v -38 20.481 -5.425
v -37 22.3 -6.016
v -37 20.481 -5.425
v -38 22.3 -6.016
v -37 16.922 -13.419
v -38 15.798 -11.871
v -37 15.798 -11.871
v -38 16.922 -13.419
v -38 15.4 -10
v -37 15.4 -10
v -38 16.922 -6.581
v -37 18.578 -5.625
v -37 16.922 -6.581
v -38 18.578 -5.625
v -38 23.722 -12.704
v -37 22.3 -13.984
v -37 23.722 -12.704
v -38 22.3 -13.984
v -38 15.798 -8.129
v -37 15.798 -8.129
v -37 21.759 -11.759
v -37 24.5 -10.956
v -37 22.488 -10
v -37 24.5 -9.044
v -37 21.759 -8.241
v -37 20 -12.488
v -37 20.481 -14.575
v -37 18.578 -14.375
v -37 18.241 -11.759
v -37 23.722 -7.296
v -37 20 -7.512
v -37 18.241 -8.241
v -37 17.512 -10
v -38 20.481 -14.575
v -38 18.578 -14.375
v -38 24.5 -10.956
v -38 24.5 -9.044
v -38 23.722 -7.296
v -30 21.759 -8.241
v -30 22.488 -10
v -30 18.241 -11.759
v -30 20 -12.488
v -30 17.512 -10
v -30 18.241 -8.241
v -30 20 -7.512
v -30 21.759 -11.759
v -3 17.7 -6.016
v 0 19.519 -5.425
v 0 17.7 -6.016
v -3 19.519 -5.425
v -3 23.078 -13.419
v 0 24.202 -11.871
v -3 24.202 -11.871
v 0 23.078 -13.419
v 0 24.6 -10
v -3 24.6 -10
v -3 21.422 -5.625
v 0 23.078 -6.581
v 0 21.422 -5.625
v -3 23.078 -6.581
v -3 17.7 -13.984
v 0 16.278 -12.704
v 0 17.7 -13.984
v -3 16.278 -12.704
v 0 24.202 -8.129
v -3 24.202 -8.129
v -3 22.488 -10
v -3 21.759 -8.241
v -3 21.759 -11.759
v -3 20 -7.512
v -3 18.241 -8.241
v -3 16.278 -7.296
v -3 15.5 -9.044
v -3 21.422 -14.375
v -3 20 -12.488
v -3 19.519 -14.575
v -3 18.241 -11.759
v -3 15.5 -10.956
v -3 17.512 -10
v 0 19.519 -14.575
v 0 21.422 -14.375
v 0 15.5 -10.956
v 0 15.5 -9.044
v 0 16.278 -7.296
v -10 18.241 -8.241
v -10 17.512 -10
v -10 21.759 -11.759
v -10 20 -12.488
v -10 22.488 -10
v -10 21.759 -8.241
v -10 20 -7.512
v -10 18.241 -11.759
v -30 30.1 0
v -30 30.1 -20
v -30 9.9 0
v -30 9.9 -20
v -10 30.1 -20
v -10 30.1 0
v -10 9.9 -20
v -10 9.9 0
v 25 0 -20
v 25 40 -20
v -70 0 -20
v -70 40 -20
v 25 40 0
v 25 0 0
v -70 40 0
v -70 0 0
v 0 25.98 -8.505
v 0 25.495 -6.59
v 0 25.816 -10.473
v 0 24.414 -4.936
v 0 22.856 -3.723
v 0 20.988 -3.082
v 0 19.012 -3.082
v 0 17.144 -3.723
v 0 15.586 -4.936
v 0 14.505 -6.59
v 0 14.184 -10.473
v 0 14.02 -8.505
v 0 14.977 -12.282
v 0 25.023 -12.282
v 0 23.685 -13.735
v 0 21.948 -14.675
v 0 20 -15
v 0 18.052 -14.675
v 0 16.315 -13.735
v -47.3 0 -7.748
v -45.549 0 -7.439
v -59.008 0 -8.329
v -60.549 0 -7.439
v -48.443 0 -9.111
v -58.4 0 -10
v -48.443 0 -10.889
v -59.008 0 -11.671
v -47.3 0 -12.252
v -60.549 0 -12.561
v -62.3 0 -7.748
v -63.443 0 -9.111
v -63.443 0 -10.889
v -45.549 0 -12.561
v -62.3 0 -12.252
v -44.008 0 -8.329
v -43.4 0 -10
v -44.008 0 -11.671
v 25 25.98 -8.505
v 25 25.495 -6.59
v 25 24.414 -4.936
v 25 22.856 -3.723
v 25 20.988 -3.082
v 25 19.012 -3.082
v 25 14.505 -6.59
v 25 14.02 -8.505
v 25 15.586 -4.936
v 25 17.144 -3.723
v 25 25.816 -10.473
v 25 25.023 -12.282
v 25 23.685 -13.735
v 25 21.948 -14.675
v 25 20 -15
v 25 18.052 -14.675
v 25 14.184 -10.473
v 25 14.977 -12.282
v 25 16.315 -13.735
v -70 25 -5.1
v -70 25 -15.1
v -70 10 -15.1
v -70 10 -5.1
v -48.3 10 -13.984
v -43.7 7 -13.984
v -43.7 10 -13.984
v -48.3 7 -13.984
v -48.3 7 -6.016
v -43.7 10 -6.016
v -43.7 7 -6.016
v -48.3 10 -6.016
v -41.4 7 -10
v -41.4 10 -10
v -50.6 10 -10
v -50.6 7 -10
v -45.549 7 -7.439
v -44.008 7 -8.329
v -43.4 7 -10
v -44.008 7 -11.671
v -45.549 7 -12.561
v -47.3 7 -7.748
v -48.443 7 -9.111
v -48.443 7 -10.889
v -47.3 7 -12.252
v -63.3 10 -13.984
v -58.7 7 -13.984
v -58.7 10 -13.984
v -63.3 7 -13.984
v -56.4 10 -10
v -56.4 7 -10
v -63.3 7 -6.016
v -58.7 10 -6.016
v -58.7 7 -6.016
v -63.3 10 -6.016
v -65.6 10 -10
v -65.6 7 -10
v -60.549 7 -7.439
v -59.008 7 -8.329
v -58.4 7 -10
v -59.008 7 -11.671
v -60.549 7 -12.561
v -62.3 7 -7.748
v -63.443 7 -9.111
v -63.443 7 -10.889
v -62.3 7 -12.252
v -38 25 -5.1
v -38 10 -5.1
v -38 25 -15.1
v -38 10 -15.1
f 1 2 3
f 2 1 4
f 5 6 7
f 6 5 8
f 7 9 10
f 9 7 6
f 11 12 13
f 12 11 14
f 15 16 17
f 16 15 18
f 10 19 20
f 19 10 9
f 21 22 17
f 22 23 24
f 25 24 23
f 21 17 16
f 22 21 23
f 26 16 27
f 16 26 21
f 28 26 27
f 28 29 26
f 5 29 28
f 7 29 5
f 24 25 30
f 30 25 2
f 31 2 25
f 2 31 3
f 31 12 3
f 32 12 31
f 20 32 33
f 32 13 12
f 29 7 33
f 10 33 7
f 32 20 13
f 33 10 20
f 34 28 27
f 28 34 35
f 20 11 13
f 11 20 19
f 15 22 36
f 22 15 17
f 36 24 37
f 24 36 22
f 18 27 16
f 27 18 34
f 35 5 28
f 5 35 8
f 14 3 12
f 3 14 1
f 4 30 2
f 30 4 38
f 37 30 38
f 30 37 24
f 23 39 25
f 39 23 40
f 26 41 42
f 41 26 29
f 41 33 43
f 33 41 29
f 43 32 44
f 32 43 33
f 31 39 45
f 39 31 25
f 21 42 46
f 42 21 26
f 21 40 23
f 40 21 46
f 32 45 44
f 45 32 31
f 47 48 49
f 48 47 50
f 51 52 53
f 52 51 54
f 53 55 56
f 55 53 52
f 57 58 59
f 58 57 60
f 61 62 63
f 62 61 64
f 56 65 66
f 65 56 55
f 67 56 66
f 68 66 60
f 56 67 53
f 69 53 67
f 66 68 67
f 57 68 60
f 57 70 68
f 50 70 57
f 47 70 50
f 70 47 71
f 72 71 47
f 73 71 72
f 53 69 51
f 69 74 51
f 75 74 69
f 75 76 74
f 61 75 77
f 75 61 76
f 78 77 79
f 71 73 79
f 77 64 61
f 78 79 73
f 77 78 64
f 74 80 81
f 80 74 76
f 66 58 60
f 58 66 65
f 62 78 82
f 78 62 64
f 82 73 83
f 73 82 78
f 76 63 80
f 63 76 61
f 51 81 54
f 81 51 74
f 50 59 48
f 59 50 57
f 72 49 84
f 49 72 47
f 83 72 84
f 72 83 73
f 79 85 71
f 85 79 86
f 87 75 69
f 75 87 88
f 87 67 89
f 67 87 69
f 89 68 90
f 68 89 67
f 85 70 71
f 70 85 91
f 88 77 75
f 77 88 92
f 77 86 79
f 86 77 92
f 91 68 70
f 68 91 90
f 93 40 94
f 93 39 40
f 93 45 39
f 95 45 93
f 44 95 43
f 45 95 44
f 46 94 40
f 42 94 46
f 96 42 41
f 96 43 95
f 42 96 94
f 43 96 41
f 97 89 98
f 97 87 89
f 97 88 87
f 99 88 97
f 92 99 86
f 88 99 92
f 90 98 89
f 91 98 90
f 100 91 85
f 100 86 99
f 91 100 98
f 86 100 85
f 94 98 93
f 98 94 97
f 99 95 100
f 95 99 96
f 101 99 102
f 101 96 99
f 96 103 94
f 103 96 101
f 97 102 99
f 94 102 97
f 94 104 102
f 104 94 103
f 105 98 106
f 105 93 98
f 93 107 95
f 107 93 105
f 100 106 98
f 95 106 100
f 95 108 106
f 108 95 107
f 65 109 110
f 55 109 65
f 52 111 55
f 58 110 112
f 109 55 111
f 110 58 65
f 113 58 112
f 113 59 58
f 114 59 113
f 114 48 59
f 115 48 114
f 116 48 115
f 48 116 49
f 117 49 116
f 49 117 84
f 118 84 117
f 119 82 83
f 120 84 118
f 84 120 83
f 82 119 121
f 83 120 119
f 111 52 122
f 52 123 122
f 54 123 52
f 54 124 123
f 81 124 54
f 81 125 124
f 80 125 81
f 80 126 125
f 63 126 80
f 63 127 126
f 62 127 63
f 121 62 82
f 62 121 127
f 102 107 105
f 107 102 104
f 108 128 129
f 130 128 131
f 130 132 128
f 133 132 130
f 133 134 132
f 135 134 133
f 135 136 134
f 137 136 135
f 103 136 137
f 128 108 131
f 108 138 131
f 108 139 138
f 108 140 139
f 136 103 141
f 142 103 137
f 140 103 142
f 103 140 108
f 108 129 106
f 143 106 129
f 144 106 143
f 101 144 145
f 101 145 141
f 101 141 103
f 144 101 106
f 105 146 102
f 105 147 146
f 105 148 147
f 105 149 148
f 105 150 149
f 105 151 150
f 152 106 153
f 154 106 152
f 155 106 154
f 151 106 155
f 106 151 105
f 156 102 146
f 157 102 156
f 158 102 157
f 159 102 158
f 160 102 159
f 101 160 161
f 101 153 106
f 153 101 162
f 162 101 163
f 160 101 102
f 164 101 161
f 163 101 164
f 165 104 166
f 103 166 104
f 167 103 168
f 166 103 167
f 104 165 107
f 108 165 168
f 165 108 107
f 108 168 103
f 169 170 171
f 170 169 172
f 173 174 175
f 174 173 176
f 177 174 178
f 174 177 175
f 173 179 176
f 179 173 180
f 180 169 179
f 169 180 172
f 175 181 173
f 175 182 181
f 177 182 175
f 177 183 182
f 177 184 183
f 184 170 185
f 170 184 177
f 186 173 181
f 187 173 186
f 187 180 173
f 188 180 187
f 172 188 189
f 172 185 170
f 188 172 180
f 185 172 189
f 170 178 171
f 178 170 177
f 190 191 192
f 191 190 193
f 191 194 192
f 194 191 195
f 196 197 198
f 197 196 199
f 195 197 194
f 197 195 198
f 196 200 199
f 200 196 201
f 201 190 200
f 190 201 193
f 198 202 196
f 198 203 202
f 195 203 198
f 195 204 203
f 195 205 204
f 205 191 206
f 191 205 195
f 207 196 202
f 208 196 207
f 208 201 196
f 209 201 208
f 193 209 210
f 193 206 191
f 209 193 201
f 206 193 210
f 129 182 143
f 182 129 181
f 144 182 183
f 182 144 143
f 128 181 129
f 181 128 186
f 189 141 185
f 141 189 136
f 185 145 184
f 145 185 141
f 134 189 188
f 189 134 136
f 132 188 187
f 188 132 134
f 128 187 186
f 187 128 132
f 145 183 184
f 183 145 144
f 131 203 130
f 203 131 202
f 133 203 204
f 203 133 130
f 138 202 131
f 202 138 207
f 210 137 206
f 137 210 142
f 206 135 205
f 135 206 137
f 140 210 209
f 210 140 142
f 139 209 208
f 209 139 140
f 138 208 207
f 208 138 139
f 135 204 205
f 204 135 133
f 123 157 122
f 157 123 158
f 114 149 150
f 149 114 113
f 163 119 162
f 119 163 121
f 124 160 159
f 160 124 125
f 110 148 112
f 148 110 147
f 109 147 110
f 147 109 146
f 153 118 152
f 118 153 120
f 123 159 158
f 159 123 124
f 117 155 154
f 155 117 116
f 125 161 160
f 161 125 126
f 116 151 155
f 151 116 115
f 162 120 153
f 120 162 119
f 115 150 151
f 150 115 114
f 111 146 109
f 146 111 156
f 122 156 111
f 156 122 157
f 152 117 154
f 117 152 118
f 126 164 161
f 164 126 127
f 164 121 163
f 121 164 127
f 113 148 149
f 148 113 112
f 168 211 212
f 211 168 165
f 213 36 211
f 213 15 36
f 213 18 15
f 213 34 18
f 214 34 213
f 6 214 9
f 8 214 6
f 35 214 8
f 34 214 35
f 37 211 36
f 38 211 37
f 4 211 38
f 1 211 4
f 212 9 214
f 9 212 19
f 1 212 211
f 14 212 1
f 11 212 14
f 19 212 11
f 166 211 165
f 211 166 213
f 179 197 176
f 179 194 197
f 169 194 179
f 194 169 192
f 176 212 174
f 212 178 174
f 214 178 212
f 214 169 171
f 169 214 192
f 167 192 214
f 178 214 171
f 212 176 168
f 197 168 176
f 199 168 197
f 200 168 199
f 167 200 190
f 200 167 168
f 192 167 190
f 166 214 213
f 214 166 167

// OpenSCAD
// file: MCAD/constants.scad
// MIT license


TAU = 6.2831853071; //2*PI, see http://tauday.com/
PI = TAU/2;

// translates a imperial measurement in inches to meters
mm_per_inch = 25.4;
// file: MCAD/math.scad
// MIT license

include <constants.scad>

function deg(angle) = 360*angle/TAU;
// file: MCAD/motors.scad
// Copyright 2010 D1plo1d

// This library is dual licensed under the GPL 3.0 and the GNU Lesser General Public License as per http://creativecommons.org/licenses/LGPL/2.1/ .

include <math.scad>


//generates a motor mount for the specified nema standard #.
module stepper_motor_mount(nema_standard,slide_distance=0, mochup=true, tolerance=0) {
	//dimensions from:
	// http://www.numberfactory.com/NEMA%20Motor%20Dimensions.htm
	if (nema_standard == 17)
	{
		_stepper_motor_mount(
			motor_shaft_diameter = 0.1968*mm_per_inch,
			motor_shaft_length = 0.945*mm_per_inch,
			pilot_diameter = 0.866*mm_per_inch,
			pilot_length = 0.80*mm_per_inch,
			mounting_bolt_circle = 1.725*mm_per_inch,
			bolt_hole_size = 3.5,
			bolt_hole_distance = 1.220*mm_per_inch,
			slide_distance = slide_distance,
			mochup = mochup,
			tolerance=tolerance);
	}
	if (nema_standard == 23)
	{
		_stepper_motor_mount(
			motor_shaft_diameter = 0.250*mm_per_inch,
			motor_shaft_length = 0.81*mm_per_inch,
			pilot_diameter = 1.500*mm_per_inch,
			pilot_length = 0.062*mm_per_inch,
			mounting_bolt_circle = 2.625*mm_per_inch,
			bolt_hole_size = 0.195*mm_per_inch,
			bolt_hole_distance = 1.856*mm_per_inch,
			slide_distance = slide_distance,
			mochup = mochup,
			tolerance=tolerance);
	}
	
}


//inner mehod for creating a stepper motor mount of any dimensions
module _stepper_motor_mount(
	motor_shaft_diameter,
	motor_shaft_length,
	pilot_diameter,
	pilot_length,
	mounting_bolt_circle,
	bolt_hole_size,
	bolt_hole_distance,
	slide_distance = 0,
	motor_length = 40, //arbitray - not standardized
	mochup,
	tolerance = 0
)
{
	union()
	{
	// == centered mount points ==
	//mounting circle inset
	translate([0,slide_distance/2,0]) circle(r = pilot_diameter/2 + tolerance);
	square([pilot_diameter,slide_distance],center=true);
	translate([0,-slide_distance/2,0]) circle(r = pilot_diameter/2 + tolerance);

	//todo: motor shaft hole
	
	//mounting screw holes
	for (x = [-1,1])
	{
		for (y = [-1,1])
		{
			translate([x*bolt_hole_distance/2,y*bolt_hole_distance/2,0])
			{
				translate([0,slide_distance/2,0]) circle(bolt_hole_size/2 + tolerance);
				translate([0,-slide_distance/2,0]) circle(bolt_hole_size/2 + tolerance);
				square([bolt_hole_size+2*tolerance,slide_distance],center=true);
			}
		}
	}
	// == motor mock-up ==
	//motor box
	if (mochup == true)
	{
		%translate([0,0,-5]) cylinder(h = 5, r = pilot_diameter/2);
		%translate(v=[0,0,-motor_length/2])
		{
			cube(size=[bolt_hole_distance+bolt_hole_size+5,bolt_hole_distance+bolt_hole_size+5,motor_length], center = true);
		}
		//shaft
		%translate(v=[0,0,-(motor_length-motor_shaft_length-2)/2])
		{
			%cylinder(r=motor_shaft_diameter/2,h=motor_length+motor_shaft_length--1, center = true);
		}
	}
	}
}
// file: bom.scad
module bom(code, desc, category) {
	echo(str("BOM: ",code," - ", desc, "; ", category));
}
// file: MCAD/shapes.scad
/*
 *  OpenSCAD Shapes Library (www.openscad.org)
 *  Copyright (C) 2009  Catarina Mota
 *  Copyright (C) 2010  Elmo Mäntynen
 *
 *  License: LGPL 2.1 or later
*/

// 2D Shapes
//ngon(sides, radius, center=false);

// 3D Shapes
//box(width, height, depth);
//roundedBox(width, height, depth, factor);
//cone(height, radius);
//ellipticalCylinder(width, height, depth);
//ellipsoid(width, height);
//tube(height, radius, wall, center = false);
//tube2(height, ID, OD, center = false);
//ovalTube(width, height, depth, wall, center = false);
//hexagon(height, depth);
//octagon(height, depth);
//dodecagon(height, depth);
//hexagram(height, depth);
//rightTriangle(adjacent, opposite, depth);
//equiTriangle(side, depth);
//12ptStar(height, depth);

//----------------------

// size is a vector [w, h, d]
module box(width, height, depth) {
  cube([width, height, depth], true);
}

// size is a vector [w, h, d]
module roundedBox(width, height, depth, radius) {
  size=[width, height, depth];
  cube(size - [2*radius,0,0], true);
  cube(size - [0,2*radius,0], true);
  for (x = [radius-size[0]/2, -radius+size[0]/2],
       y = [radius-size[1]/2, -radius+size[1]/2]) {
    translate([x,y,0]) cylinder(r=radius, h=size[2], center=true);
  }
}

module cone(height, radius, center = false) {
  cylinder(height, radius, 0, center);
}

module ellipticalCylinder(w,h, height, center = false) {
  scale([1, h/w, 1]) cylinder(h=height, r=w, center=center);
}

module ellipsoid(w, h, center = false) {
  scale([1, h/w, 1]) sphere(r=w/2, center=center);
}

// wall is wall thickness
module tube(height, radius, wall, center = false) {
  difference() {
    cylinder(h=height, r=radius, center=center);
    cylinder(h=height, r=radius-wall, center=center);
  }
}

// wall is wall thickness
module tube2(height, ID, OD, center = false) {
  difference() {
    cylinder(h=height, r=OD/2, center=center);
    cylinder(h=height, r=ID/2, center=center);
  }
}

// wall is wall thickness
module ovalTube(height, rx, ry, wall, center = false) {
  difference() {
    scale([1, ry/rx, 1]) cylinder(h=height, r=rx, center=center);
    scale([(rx-wall)/rx, (ry-wall)/rx, 1]) cylinder(h=height, r=rx, center=center);
  }
}

// size is the XY plane size, height in Z
module hexagon(size, height) {
  boxWidth = size/1.75;
  for (r = [-60, 0, 60]) rotate([0,0,r]) cube([boxWidth, size, height], true);
}

// size is the XY plane size, height in Z
module octagon(size, height) {
  intersection() {
    cube([size, size, height], true);
    rotate([0,0,45]) cube([size, size, height], true);
  }
}

// size is the XY plane size, height in Z
module dodecagon(size, height) {
  intersection() {
    hexagon(size, height);
    rotate([0,0,90]) hexagon(size, height);
  }
}

// size is the XY plane size, height in Z
module hexagram(size, height) {
  boxWidth=size/1.75;
  for (v = [[0,1],[0,-1],[1,-1]]) {
    intersection() {
      rotate([0,0,60*v[0]]) cube([size, boxWidth, height], true);
      rotate([0,0,60*v[1]]) cube([size, boxWidth, height], true);
    }
  }
}

module rightTriangle(adjacent, opposite, height) {
  difference() {
    translate([-adjacent/2,opposite/2,0]) cube([adjacent, opposite, height], true);
    translate([-adjacent,0,0]) {
      rotate([0,0,atan(opposite/adjacent)]) dislocateBox(adjacent*2, opposite, height+2);
    }
  }
}

module equiTriangle(side, height) {
  difference() {
    translate([-side/2,side/2,0]) cube([side, side, height], true);
    rotate([0,0,30]) dislocateBox(side*2, side, height);
    translate([-side,0,0]) {
      rotate([0,0,60]) dislocateBox(side*2, side, height);
    }
  }
}

module 12ptStar(size, height) {
  starNum = 3;
  starAngle = 360/starNum;
  for (s = [1:starNum]) {
    rotate([0, 0, s*starAngle]) cube([size, size, height], true);
  }
}

//-----------------------
//MOVES THE ROTATION AXIS OF A BOX FROM ITS CENTER TO THE BOTTOM LEFT CORNER
module dislocateBox(w, h, d) {
  translate([0,0,-d/2]) cube([w,h,d]);
}

//-----------------------
// Tests
//module test2D_ellipse(){ellipse(10, 5);}
module test_ellipsoid(){ellipsoid(10, 5);}

//module test2D_egg_outline(){egg_outline();}
// file: MCAD/materials.scad
/*
 * Material colors.
 * 
 * Originally by Hans Häggström, 2010.
 * Dual licenced under Creative Commons Attribution-Share Alike 3.0 and LGPL2 or later
 */

// Material colors
Oak = [0.65, 0.5, 0.4];
Pine = [0.85, 0.7, 0.45];
Birch = [0.9, 0.8, 0.6];
FiberBoard = [0.7, 0.67, 0.6];
BlackPaint = [0.2, 0.2, 0.2];
Iron = [0.36, 0.33, 0.33];
Steel = [0.65, 0.67, 0.72];
Stainless = [0.45, 0.43, 0.5];
Aluminum = [0.77, 0.77, 0.8];
Brass = [0.88, 0.78, 0.5];
Transparent = [1, 1, 1, 0.2];

// Example, uncomment to view
//color_demo();

module color_demo(){
    // Wood
    colorTest(Oak, 0, 0);
    colorTest(Pine, 1, 0);
    colorTest(Birch, 2, 0);

    // Metals
    colorTest(Iron, 0, 1);
    colorTest(Steel, 1, 1);
    colorTest(Stainless, 2, 1);
    colorTest(Aluminum, 3, 1);

    // Mixboards
    colorTest(FiberBoard, 0, 2);

    // Paints
    colorTest(BlackPaint, 0, 3);
}

module colorTest(col, row=0, c=0) {
  color(col) translate([row * 30,c*30,0]) sphere(r=10);
}
// file: MCAD/units.scad
/*
 * Basic units.
 * 
 * Originally by Hans Häggström, 2010.
 * Dual licenced under Creative Commons Attribution-Share Alike 3.0 and LGPL2 or later
 */


mm = 1;
cm = 10 * mm;
dm = 100 * mm;
m = 1000 * mm;

inch = 25.4 * mm;

X = [1, 0, 0];
Y = [0, 1, 0];
Z = [0, 0, 1];

M3 = 3*mm;
M4 = 4*mm;
M5 = 5*mm;
M6 = 6*mm;
M8 = 8*mm;


// When a small distance is needed to overlap shapes for boolean cutting, etc.
epsilon = 0.01*mm;
// file: nemamount.scad
include <MCAD/units.scad>;
include <MCAD/materials.scad>
include <MCAD/stepper.scad>
include <MCAD/motors.scad>
use <MCAD/shapes.scad>;
$fn = 32;




module motor_support(ht)
{
   difference(){
	  translate([-22.5,23.5,0]) rotate([90,0,0]) motor_support_body(ht);
      translate([0,1,0]) rotate([90,0,0]) motor_support_cuts(ht);
      }
}

module motor_support_body(ht)
{
	cube([45,ht,48.5]);

}


module motor_support_cuts(ht)
{
// Motor shaft/pulley cutout.
      translate([0,.1,0]) rotate([90, 0, 0]) cylinder(r=12, h=ht*2, center=true, $fn=60);
      // NEMA 17 stepper motor mounting screws.
      for (x = [-1, 1]) for (z = [-1, 1]) {
        scale([x, 1, z]) translate([15.5, .1, 15.5]) {
          rotate([90, 0, 0]) cylinder(r=4, h=ht*2, center=true, $fn=12);
          }
        }
}



module nema_geared_cutout()
{
    //pulley opening
    translate([16,1,21]) rotate([90,0,0]){
      cylinder (h=22, r=6.6);

      rotate([0,0,45]) {
        translate([14,0,0]) cylinder(h=22, r=1.6, $fn=12);
        translate([0,14,0]) cylinder(h=22, r=1.6, $fn=12);
        translate([-14,0,0]) cylinder(h=22, r=1.6, $fn=12);
        translate([0,-14,0]) cylinder(h=22, r=1.6, $fn=12);
      }
     
    }

    //gearhead indentation
    translate([16,-5,21]) rotate([90,0,0]) cylinder (h=3.35, r=11.25);

  
    
}

module nema_cutout()
{
// Motor shaft/pulley cutout.
      rotate([90, 0, 0]) cylinder(r=12, h=20, center=true, $fn=60);
      // NEMA 17 stepper motor mounting screws.
      for (x = [-1, 1]) for (z = [-1, 1]) {
        scale([x, 1, z]) translate([15.5, -5, 15.5]) {
          rotate([90, 0, 0]) cylinder(r=1.65, h=20, center=true, $fn=12);
          }
        }
}

module nema_motor()
{
   union(){
     nema_mount();
     %translate([0,-4,1]) rotate([90,0,0]) motor(Nema17, size=NemaLong , dualAxis=false);
     }
}

module nema_motor_inverse()
{
   union(){
     nema_mount_inverse();
     %translate([0,-4,1]) rotate([90,0,0]) motor(Nema17, size=NemaLong , dualAxis=false);
     }
}

module nema_geared_motor_inverse()
{
   union(){
     nema_geared_inverse();
     %translate([16,-7,22]) rotate([90,0,180]) motor(Nema17, NemaLong, dualAxis=false);
    
     }
}

module nema_geared_motor()
{
   union(){
     nema_geared_mount();
     %translate([16,-7,22]) rotate([90,0,180]) motor(Nema17, NemaLong, dualAxis=false);
    
     }
}

module nema_geared_mount()
{
   difference(){
      union(){
           translate([-6,-6,0]) rotate([90,0,0]) cube([45,45,7]);
           translate([-6,-13,-4]) rotate([0,0,0]) cube([45,25,5]);
           translate([-6,-13,44]) rotate([0,0,0]) cube([45,25,5]);
           }
      translate([0,0,1]) nema_geared_cutout();
      }


}

module nema_geared_inverse()
{
   difference(){
      union(){
           translate([-6,-6,0]) rotate([90,0,0]) cube([45,45,7]);
           translate([-6,-31,-4]) rotate([0,0,0]) cube([45,25,5]);
           translate([-6,-31,44]) rotate([0,0,0]) cube([45,25,5]);
           }
      translate([0,0,1]) nema_geared_cutout();
      }


}

module nema_mount_inverse()
{
   difference(){
      union(){
        translate([-22.5,0,-21.5]) rotate([90,0,0]) cube([45,45,5]);
        translate([-22.5,-5,-25]) rotate([0,0,0]) cube([45,25,5]);
        }
      translate([0,0,1]) nema_cutout();
      }
   //nema_cutout();
}

module nema_mount()
{
   difference(){
      union(){
        translate([-22.5,0,-21.5]) rotate([90,0,0]) cube([45,45,5]);
        translate([-22.5,-25,-25]) rotate([0,0,0]) cube([45,25,5]);
        }
      translate([0,0,1]) nema_cutout();
      }
   //nema_cutout();
}

//nema_motor_inverse();
translate([0,0,40]) rotate([270,0,0]) nema_motor();
translate([0,0,0]) motor_support(40);
//nema_geared_motor();
//nema_geared_motor_inverse();
// file: vslot.scad
include <MCAD/units.scad>;
include <MCAD/materials.scad>
use <MCAD/shapes.scad>;
use <bom.scad>;

vslot_color_black = [0.27, 0.27, 0.3];
vslot_color = Aluminum;

module vslot(length=50, sections=1, finish, cutout=0) {
	size = sections * 20;
	bom(str("vslot20x", size, "x", length), str("v-slot 20x", size, " (", length , "mm)"), ["rail", "extrusion", "structure"]);
	cutext = [[12.00,4.50],[10.00,4.50],[8.20,2.78],[8.20,5.50],[6.56,5.50],[3.90,2.84],[3.90,0.21],[3.69,0.00],[3.90,-0.21],[3.90,-2.84],[6.56,-5.50],[8.20,-5.50],[8.20,-2.78],[10.00,-4.50],[12.00,-4.50]];
	cutint = [[16.10,0.21],[16.10,2.84],[12.70,6.24],[12.70,8.78],[7.30,8.78],[7.30,6.24],[3.90,2.84],[3.90,0.21],[3.69,0.00],[3.90,-0.21],[3.90,-2.84],[7.30,-6.24],[7.30,-8.78],[12.70,-8.78],[12.70,-6.24],[16.10,-2.84],[16.10,-0.21],[16.31,0.00],];
	cutcorner = [[8.20,8.20],[6.57,8.20],[6.57,7.66],[7.66,6.57],[8.20,6.57]];

	module profile() {
        
		difference() {
         
			translate([0,0,length/2])
			roundedBox(20 * sections, 20, length, 1.5);
         if (cutout == 0){
			for(i = [0,180]) rotate([0,0,-i]) translate([10 * (sections - 1), 0, -epsilon/2]) {
				linear_extrude(length+20) polygon(cutext);
				translate([5,-2.89,-20]) cube([10,5.78,length+40]);
			}
          
			for(i = [90,270]) rotate([0,0,-i])
				for(j = [0:sections-1]) translate([0, (sections - 1) * 10 - 20 * j, -epsilon/2]) {
					linear_extrude(length+epsilon) polygon(cutext);
					translate([5,-2.89,-20]) cube([10,5.78,length+40]);
				}

			for(i = [0:sections-1]) translate([i * 20 - 10 * (sections - 1),0,-epsilon/2])
				cylinder(length+20, 2.1, 2.1);

			for(i = [90,270]) rotate([0,0,-i])
				translate([0,(sections - 1) * 10,-epsilon/2])
				linear_extrude(length+epsilon) polygon(cutcorner);
			for(i = [ 0,180]) rotate([0,0,-i])
				translate([(sections - 1) * 10,0,-epsilon/2])
				linear_extrude(length+epsilon) polygon(cutcorner);

			if(sections > 1)
				for(i = [0:sections-2]) translate([(sections - 3) * 10 - i * 20, 0, -epsilon/2])
					linear_extrude(length+epsilon) polygon(cutint);
                      }
		}
	}

      if (cutout == 1){
		 translate([0,0,length/2]) box(20 * sections, 20.2, length);
          } else {
	     if(finish)
		   color(finish) profile();
	     else
		   color(vslot_color) profile();
         }
}

module vslot20x20(length, finish) { vslot(length, 1, finish); }
module vslot20x20_cutout(length, finish) { vslot(length, 1, finish, 1); }


module vslot20x40(length, finish) { vslot(length, 2, finish); }
module vslot20x40_cutout(length, finish) { vslot(length, 2, finish, 1); }

module vslot20x60(length, finish) { vslot(length, 3, finish); }
module vslot20x60_cutout(length, finish) { vslot(length, 3, finish, 1); }

module vslot20x80(length, finish) { vslot(length, 4, finish); }
module vslot20x80_cutout(length, finish) { vslot(length, 4, finish, 1); }


module vslot_test() {
	$fn = 32;

	vslot20x20(100);

	translate([0, 40, 0])
	vslot20x40(100, vslot_color_black);

	translate([0, 80, 0])
	vslot20x60(100);

	translate([0, 120, 0])
	vslot20x80(100, vslot_color_black);

    translate([0,140,0]) vslot20x20_cutout(100);
}

vslot_test();
// file: spacer.scad
use <mountblock.scad>;
use <nemamount.scad>;
use <MCAD/nuts_and_bolts.scad>;

module spacerblock()
{
   // %translate([18,-5,-2]) rotate([0,180,0]) boltHole(5, length=20);
   // %translate([48,-5,-2]) rotate([0,180,0]) boltHole(5, length=20);
   // %translate([33,-5,-17]) rotate([0,0,0]) boltHole(5,length=30);
   // %translate([33,-5,-21]) nutHole(5);
	difference(){
        translate([60,5,-20]) rotate([180,180,0]) cube([52,20,21]);
        translate([18,-5,-2]) rotate([0,180,0]) boltHole(5, length=20);
        translate([48,-5,-2]) rotate([0,180,0]) boltHole(5, length=20);
        translate([33,-5,-2]) rotate([0,180,0]) boltHole(5, length=20);
        translate([48,-105,-2]) nutHole(5);
        translate([33,-5,-17]) rotate([0,180,0]) cylinder(r=3,length=30);
        translate([33,-5,-21]) nutHole(5);
        }
}

spacerblock();
// file: zcorner.scad
use <mountblock.scad>;
use <nemamount.scad>;
use <MCAD/nuts_and_bolts.scad>;

module zmotor_body()
{
    translate([0,0,0]) rotate([0,180,0]) mountblock();
	translate([-40,-2,39]) rotate([0,90,90]) nema_geared_motor();
    translate([-70,-10,-20]) cube([31,60,20]);
    translate([-41,-10,-20]) cube([41,10,20]);
    translate([-41,40,-20]) cube([41,10,20]);
    translate([0,-10,-20]) cube([31,60,20]);
    %translate([-46,41,-10]) rotate([90,0,0]) nutHole(5);
    
   // %translate([-38,20,-10.1]) rotate([0,90,180]) cylinder(r=6,h=33);
    
    %translate([20,40,-1]) rotate([0,180,0]) boltHole(5,length=30);
    %translate([ 0,40,-1]) rotate([0,180,0]) boltHole(5,length=30);
    %translate([-4,0,-1]) rotate([0,180,0]) boltHole(5,length=50);
   // %translate([-1,20,-9.1]) rotate([0,90,0]) cylinder(r=6,h=34);
}

module zmotor_cuts()
{
    translate([-46,41,-10]) rotate([90,0,0]) nutHole(5);
    translate([-61,41,-10]) rotate([90,0,0]) nutHole(5);
    translate([20,40,-1]) rotate([0,180,0]) boltHole(5,length=30);
    translate([ 0,40,-1]) rotate([0,180,0]) boltHole(5,length=30);
    translate([-38,20,-10.1]) rotate([0,90,180]) cylinder(r=6,h=34);
    translate([-1,20,-9.1]) rotate([0,90,0]) cylinder(r=6,h=50);
    translate([-4,0,-1]) rotate([0,180,0]) boltHole(5,length=50);
}





module zmotor()
{
   difference(){
       zmotor_body();
       zmotor_cuts();
       }
}


zmotor();
// file: ycorner.scad
use <cornerparts.scad>
use <mountblock.scad>;
use <nemamount.scad>;
use <MCAD/nuts_and_bolts.scad>;

module ymotor_body()
{
    translate([0,0,0]) rotate([0,180,0]) mountblock();
	translate([0,20,25]) rotate([0,0,90]) nema_motor();
    translate([0,0,-20]) cube([25,40,20]);
    translate([-70,0,-20]) cube([31,40,20]);
    %translate([0,20,-10.1]) rotate([0,90,0]) cylinder(r=6,h=26.2);
    %translate([-46,11,-10]) rotate([90,0,0]) nutHole(5);
    %translate([-61,11,-10]) rotate([90,0,0]) nutHole(5);
	//%translate([-38,20,-10.1]) rotate([0,90,180]) cylinder(r=6,h=33);

    
}

module ymotor_cuts()
{
    translate([-46,11,-10]) rotate([90,0,0]) nutHole(5);
    translate([-61,11,-10]) rotate([90,0,0]) nutHole(5);
    translate([-46,11,-10]) rotate([90,0,0]) cylinder(r=2.6,h=20);
    translate([-61,11,-10]) rotate([90,0,0]) cylinder(r=2.6,h=20);

    translate([0,20,-9]) rotate([0,90,0]) cylinder(r=6,h=35);

     translate([-38,25,-5.1]) rotate([0,90,180]) cube([10,15,35]); 
}

module ymotor()
{
   difference(){
       ymotor_body();
       ymotor_cuts();
       }


}


ymotor();
// file: xcorner.scad
use <mountblock.scad>;
use <nemamount.scad>;
use <MCAD/nuts_and_bolts.scad>;

module xmotor_body()
{
	translate([0,0,0]) rotate([0,180,0]) mountblock();
	translate([0,20,25]) rotate([0,0,90]) nema_motor();
    translate([0,0,-20]) cube([25,40,20]);
    %translate([20,20,-10]) rotate([0,90,0]) cylinder(r=6,h=45.2);
    translate([0,40,0]) rotate([0,180,0])cube([50,10,20]);
    translate([-40,0,0]) rotate([0,180,0])cube([10,40,20]);
    %translate([-25,40,-3]) rotate([0,180,270]) boltHole(5, length=20);
    %translate([-40,40,-3]) rotate([0,180,270]) boltHole(5, length=20);

   
    
}

module xmotor_cuts()
{
     translate([0,20,-10.1]) rotate([0,90,0]) cylinder(r=6,h=26.2);
     translate([0,20,-10.1]) rotate([0,90,0]) cylinder(r=6,h=26.2);
     translate([-65,20,-10.1]) rotate([0,90,0]) cylinder(r=6,h=26.2);
     translate([-25,40,0]) rotate([0,180,270]) cylinder(r=6, h=5);
     translate([-40,40,0]) rotate([0,180,270]) cylinder(r=6, h=5);
     translate([-25,40,-9]) rotate([0,180,270]) boltHole(5, length=12);
     translate([-40,40,-9]) rotate([0,180,270]) boltHole(5, length=12);
     
}

module xmotor()
{
	difference(){
       xmotor_body();
       xmotor_cuts();
       }

}

xmotor();
// file: MCAD/nuts_and_bolts.scad
// Copyright 2010 D1plo1d

// This library is dual licensed under the GPL 3.0 and the GNU Lesser General Public License as per http://creativecommons.org/licenses/LGPL/2.1/ .

//testNutsAndBolts();

module SKIPtestNutsAndBolts()
{
	$fn = 360;
	translate([0,15])nutHole(3, proj=2);
	boltHole(3, length= 30, proj=2);
}

MM = "mm";
INCH = "inch"; //Not yet supported

//Based on: http://www.roymech.co.uk/Useful_Tables/Screws/Hex_Screws.htm
METRIC_NUT_AC_WIDTHS =
[
	-1, //0 index is not used but reduces computation
	-1,
	-1,
	6.40,//m3
	8.10,//m4
	9.20,//m5
	11.50,//m6
	-1,
	15.00,//m8
	-1,
	19.60,//m10
	-1,
	22.10,//m12
	-1,
	-1,
	-1,
	27.70,//m16
	-1,
	-1,
	-1,
	34.60,//m20
	-1,
	-1,
	-1,
	41.60,//m24
	-1,
	-1,
	-1,
	-1,
	-1,
	53.1,//m30
	-1,
	-1,
	-1,
	-1,
	-1,
	63.5//m36
];
METRIC_NUT_THICKNESS =
[
	-1, //0 index is not used but reduces computation
	-1,
	-1,
	2.40,//m3
	3.20,//m4
	4.00,//m5
	5.00,//m6
	-1,
	6.50,//m8
	-1,
	8.00,//m10
	-1,
	10.00,//m12
	-1,
	-1,
	-1,
	13.00,//m16
	-1,
	-1,
	-1,
	16.00//m20
	-1,
	-1,
	-1,
	19.00,//m24
	-1,
	-1,
	-1,
	-1,
	-1,
	24.00,//m30
	-1,
	-1,
	-1,
	-1,
	-1,
	29.00//m36
];

COURSE_METRIC_BOLT_MAJOR_THREAD_DIAMETERS =
[//based on max values
	-1, //0 index is not used but reduces computation
	-1,
	-1,
	2.98,//m3
	3.978,//m4
	4.976,//m5
	5.974,//m6
	-1,
	7.972,//m8
	-1,
	9.968,//m10
	-1,
	11.966,//m12
	-1,
	-1,
	-1,
	15.962,//m16
	-1,
	-1,
	-1,
	19.958,//m20
	-1,
	-1,
	-1,
	23.952,//m24
	-1,
	-1,
	-1,
	-1,
	-1,
	29.947,//m30
	-1,
	-1,
	-1,
	-1,
	-1,
	35.940//m36
];

module nutHole(size, units=MM, tolerance = +0.0001, proj = -1)
{
	//takes a metric screw/nut size and looksup nut dimensions
	radius = METRIC_NUT_AC_WIDTHS[size]/2+tolerance;
	height = METRIC_NUT_THICKNESS[size]+tolerance;
	if (proj == -1)
	{
		cylinder(r= radius, h=height, $fn = 6, center=[0,0]);
	}
	if (proj == 1)
	{
		circle(r= radius, $fn = 6);
	}
	if (proj == 2)
	{
		translate([-radius/2, 0])
			square([radius*2, height]);
	}
}

module boltHole(size, units=MM, length, tolerance = +0.0001, proj = -1)
{
	radius = COURSE_METRIC_BOLT_MAJOR_THREAD_DIAMETERS[size]/2+tolerance;
//TODO: proper screw cap values
	capHeight = METRIC_NUT_THICKNESS[size]+tolerance; //METRIC_BOLT_CAP_HEIGHTS[size]+tolerance;
	capRadius = METRIC_NUT_AC_WIDTHS[size]/2+tolerance; //METRIC_BOLT_CAP_RADIUS[size]+tolerance;

	if (proj == -1)
	{
	translate([0, 0, -capHeight])
		cylinder(r= capRadius, h=capHeight);
	cylinder(r = radius, h = length);
	}
	if (proj == 1)
	{
		circle(r = radius);
	}
	if (proj == 2)
	{
		translate([-capRadius/2, -capHeight])
			square([capRadius*2, capHeight]);
		square([radius*2, length]);
	}
}
// file: pulley.scad
use <MCAD/nuts_and_bolts.scad>;

module pulley_wall(xside)
{
   hull(){
       translate([0,0,0]) cube([20,3,2]);
       translate([8.5,0,18]) cube([3,3,2]);
       if (xside==0){
          translate([8.5,7,0]) cube([1,1,1]);
          translate([10,4,9]) rotate([90,0,0]) cylinder(r=3,h=10);
          
         } else {
          translate([8.5,-5,0]) cube([1,1,1]);
          translate([10,8,9]) rotate([90,0,0]) cylinder(r=3,h=10);
         }
       }
    
}

module pulley_body()
{
    translate([0,0,0])   pulley_wall(1);
    translate([0,22,0])  pulley_wall(0);
    %translate([10,-2,9]) rotate([90,0,180]) boltHole(3,length=28);
    %translate([10,27,9]) rotate([90,0,180]) nutHole(3); 
}

module pulley_cuts()
{
    translate([10,-2,9]) rotate([90,0,180]) boltHole(3,length=28);
    translate([10,25,9]) rotate([90,0,180]) nutHole(3);  
}

module pulley()
{
	difference(){
        translate([23,21,-12]) rotate([90,0,270]) pulley_body();
        translate([23,21,-12]) rotate([90,0,270]) pulley_cuts();
        }
    

}



pulley();
// file: mountblock.scad
use <vslot.scad>;
use <MCAD/nuts_and_bolts.scad>;


module mountblock_body()
{
	cube([40,40,20]);
	translate([20,20,0]) %vslot20x20(200);
     %translate([37,20,10]) rotate([90,0,270]) boltHole(5, length=18);
     %translate([3,20,10]) rotate([90,0,90]) boltHole(5, length=18);
}


module mountblock_cuts()
{
	translate([20,20,-0.2]) vslot20x20_cutout(80.1);
    translate([37,20,10]) rotate([90,0,270]) boltHole(5, length=18);
    translate([3,20,10]) rotate([90,0,90]) boltHole(5, length=18);
}


module mountblock()
{
	difference(){
         mountblock_body();
         mountblock_cuts();
         }

}


mountblock();
// file: cornerparts.scad
use <xcorner.scad>;
use <ycorner.scad>;
use <zcorner.scad>;
use <spacer.scad>;









rotate([0,90,180]) xmotor();
translate([20,-50,-21]) rotate([90,90,0]) ymotor();
translate([51,20,50]) rotate([0,0,180]) zmotor();
translate([22,25,29]) spacerblock();
// main file
use <cornerparts.scad>
use <mountblock.scad>;
use <pulley.scad>;
use <MCAD/nuts_and_bolts.scad>;

module bymotor_body()
{
    translate([0,0,0]) rotate([0,180,0]) mountblock();
    translate([0,0,-20]) cube([25,40,20]);
    translate([-70,0,-20]) cube([31,40,20]);
    %translate([0,20,-10.1]) rotate([0,90,0]) cylinder(r=6,h=26.2);
    %translate([-46,11,-10]) rotate([90,0,0]) nutHole(5);
    %translate([-61,11,-10]) rotate([90,0,0]) nutHole(5);
	//%translate([-38,20,-10.1]) rotate([0,90,180]) cylinder(r=6,h=33);

    
}

module bymotor_cuts()
{
    translate([-46,11,-10]) rotate([90,0,0]) nutHole(5);
    translate([-61,11,-10]) rotate([90,0,0]) nutHole(5);
    translate([-46,11,-10]) rotate([90,0,0]) cylinder(r=2.6,h=20);
    translate([-61,11,-10]) rotate([90,0,0]) cylinder(r=2.6,h=20);

    translate([0,20,-9]) rotate([0,90,0]) cylinder(r=6,h=35);

     translate([-38,25,-5.1]) rotate([0,90,180]) cube([10,15,35]); 
}

module bymotor()
{
   difference(){
       bymotor_body();
       bymotor_cuts();
       }


}


bymotor();
